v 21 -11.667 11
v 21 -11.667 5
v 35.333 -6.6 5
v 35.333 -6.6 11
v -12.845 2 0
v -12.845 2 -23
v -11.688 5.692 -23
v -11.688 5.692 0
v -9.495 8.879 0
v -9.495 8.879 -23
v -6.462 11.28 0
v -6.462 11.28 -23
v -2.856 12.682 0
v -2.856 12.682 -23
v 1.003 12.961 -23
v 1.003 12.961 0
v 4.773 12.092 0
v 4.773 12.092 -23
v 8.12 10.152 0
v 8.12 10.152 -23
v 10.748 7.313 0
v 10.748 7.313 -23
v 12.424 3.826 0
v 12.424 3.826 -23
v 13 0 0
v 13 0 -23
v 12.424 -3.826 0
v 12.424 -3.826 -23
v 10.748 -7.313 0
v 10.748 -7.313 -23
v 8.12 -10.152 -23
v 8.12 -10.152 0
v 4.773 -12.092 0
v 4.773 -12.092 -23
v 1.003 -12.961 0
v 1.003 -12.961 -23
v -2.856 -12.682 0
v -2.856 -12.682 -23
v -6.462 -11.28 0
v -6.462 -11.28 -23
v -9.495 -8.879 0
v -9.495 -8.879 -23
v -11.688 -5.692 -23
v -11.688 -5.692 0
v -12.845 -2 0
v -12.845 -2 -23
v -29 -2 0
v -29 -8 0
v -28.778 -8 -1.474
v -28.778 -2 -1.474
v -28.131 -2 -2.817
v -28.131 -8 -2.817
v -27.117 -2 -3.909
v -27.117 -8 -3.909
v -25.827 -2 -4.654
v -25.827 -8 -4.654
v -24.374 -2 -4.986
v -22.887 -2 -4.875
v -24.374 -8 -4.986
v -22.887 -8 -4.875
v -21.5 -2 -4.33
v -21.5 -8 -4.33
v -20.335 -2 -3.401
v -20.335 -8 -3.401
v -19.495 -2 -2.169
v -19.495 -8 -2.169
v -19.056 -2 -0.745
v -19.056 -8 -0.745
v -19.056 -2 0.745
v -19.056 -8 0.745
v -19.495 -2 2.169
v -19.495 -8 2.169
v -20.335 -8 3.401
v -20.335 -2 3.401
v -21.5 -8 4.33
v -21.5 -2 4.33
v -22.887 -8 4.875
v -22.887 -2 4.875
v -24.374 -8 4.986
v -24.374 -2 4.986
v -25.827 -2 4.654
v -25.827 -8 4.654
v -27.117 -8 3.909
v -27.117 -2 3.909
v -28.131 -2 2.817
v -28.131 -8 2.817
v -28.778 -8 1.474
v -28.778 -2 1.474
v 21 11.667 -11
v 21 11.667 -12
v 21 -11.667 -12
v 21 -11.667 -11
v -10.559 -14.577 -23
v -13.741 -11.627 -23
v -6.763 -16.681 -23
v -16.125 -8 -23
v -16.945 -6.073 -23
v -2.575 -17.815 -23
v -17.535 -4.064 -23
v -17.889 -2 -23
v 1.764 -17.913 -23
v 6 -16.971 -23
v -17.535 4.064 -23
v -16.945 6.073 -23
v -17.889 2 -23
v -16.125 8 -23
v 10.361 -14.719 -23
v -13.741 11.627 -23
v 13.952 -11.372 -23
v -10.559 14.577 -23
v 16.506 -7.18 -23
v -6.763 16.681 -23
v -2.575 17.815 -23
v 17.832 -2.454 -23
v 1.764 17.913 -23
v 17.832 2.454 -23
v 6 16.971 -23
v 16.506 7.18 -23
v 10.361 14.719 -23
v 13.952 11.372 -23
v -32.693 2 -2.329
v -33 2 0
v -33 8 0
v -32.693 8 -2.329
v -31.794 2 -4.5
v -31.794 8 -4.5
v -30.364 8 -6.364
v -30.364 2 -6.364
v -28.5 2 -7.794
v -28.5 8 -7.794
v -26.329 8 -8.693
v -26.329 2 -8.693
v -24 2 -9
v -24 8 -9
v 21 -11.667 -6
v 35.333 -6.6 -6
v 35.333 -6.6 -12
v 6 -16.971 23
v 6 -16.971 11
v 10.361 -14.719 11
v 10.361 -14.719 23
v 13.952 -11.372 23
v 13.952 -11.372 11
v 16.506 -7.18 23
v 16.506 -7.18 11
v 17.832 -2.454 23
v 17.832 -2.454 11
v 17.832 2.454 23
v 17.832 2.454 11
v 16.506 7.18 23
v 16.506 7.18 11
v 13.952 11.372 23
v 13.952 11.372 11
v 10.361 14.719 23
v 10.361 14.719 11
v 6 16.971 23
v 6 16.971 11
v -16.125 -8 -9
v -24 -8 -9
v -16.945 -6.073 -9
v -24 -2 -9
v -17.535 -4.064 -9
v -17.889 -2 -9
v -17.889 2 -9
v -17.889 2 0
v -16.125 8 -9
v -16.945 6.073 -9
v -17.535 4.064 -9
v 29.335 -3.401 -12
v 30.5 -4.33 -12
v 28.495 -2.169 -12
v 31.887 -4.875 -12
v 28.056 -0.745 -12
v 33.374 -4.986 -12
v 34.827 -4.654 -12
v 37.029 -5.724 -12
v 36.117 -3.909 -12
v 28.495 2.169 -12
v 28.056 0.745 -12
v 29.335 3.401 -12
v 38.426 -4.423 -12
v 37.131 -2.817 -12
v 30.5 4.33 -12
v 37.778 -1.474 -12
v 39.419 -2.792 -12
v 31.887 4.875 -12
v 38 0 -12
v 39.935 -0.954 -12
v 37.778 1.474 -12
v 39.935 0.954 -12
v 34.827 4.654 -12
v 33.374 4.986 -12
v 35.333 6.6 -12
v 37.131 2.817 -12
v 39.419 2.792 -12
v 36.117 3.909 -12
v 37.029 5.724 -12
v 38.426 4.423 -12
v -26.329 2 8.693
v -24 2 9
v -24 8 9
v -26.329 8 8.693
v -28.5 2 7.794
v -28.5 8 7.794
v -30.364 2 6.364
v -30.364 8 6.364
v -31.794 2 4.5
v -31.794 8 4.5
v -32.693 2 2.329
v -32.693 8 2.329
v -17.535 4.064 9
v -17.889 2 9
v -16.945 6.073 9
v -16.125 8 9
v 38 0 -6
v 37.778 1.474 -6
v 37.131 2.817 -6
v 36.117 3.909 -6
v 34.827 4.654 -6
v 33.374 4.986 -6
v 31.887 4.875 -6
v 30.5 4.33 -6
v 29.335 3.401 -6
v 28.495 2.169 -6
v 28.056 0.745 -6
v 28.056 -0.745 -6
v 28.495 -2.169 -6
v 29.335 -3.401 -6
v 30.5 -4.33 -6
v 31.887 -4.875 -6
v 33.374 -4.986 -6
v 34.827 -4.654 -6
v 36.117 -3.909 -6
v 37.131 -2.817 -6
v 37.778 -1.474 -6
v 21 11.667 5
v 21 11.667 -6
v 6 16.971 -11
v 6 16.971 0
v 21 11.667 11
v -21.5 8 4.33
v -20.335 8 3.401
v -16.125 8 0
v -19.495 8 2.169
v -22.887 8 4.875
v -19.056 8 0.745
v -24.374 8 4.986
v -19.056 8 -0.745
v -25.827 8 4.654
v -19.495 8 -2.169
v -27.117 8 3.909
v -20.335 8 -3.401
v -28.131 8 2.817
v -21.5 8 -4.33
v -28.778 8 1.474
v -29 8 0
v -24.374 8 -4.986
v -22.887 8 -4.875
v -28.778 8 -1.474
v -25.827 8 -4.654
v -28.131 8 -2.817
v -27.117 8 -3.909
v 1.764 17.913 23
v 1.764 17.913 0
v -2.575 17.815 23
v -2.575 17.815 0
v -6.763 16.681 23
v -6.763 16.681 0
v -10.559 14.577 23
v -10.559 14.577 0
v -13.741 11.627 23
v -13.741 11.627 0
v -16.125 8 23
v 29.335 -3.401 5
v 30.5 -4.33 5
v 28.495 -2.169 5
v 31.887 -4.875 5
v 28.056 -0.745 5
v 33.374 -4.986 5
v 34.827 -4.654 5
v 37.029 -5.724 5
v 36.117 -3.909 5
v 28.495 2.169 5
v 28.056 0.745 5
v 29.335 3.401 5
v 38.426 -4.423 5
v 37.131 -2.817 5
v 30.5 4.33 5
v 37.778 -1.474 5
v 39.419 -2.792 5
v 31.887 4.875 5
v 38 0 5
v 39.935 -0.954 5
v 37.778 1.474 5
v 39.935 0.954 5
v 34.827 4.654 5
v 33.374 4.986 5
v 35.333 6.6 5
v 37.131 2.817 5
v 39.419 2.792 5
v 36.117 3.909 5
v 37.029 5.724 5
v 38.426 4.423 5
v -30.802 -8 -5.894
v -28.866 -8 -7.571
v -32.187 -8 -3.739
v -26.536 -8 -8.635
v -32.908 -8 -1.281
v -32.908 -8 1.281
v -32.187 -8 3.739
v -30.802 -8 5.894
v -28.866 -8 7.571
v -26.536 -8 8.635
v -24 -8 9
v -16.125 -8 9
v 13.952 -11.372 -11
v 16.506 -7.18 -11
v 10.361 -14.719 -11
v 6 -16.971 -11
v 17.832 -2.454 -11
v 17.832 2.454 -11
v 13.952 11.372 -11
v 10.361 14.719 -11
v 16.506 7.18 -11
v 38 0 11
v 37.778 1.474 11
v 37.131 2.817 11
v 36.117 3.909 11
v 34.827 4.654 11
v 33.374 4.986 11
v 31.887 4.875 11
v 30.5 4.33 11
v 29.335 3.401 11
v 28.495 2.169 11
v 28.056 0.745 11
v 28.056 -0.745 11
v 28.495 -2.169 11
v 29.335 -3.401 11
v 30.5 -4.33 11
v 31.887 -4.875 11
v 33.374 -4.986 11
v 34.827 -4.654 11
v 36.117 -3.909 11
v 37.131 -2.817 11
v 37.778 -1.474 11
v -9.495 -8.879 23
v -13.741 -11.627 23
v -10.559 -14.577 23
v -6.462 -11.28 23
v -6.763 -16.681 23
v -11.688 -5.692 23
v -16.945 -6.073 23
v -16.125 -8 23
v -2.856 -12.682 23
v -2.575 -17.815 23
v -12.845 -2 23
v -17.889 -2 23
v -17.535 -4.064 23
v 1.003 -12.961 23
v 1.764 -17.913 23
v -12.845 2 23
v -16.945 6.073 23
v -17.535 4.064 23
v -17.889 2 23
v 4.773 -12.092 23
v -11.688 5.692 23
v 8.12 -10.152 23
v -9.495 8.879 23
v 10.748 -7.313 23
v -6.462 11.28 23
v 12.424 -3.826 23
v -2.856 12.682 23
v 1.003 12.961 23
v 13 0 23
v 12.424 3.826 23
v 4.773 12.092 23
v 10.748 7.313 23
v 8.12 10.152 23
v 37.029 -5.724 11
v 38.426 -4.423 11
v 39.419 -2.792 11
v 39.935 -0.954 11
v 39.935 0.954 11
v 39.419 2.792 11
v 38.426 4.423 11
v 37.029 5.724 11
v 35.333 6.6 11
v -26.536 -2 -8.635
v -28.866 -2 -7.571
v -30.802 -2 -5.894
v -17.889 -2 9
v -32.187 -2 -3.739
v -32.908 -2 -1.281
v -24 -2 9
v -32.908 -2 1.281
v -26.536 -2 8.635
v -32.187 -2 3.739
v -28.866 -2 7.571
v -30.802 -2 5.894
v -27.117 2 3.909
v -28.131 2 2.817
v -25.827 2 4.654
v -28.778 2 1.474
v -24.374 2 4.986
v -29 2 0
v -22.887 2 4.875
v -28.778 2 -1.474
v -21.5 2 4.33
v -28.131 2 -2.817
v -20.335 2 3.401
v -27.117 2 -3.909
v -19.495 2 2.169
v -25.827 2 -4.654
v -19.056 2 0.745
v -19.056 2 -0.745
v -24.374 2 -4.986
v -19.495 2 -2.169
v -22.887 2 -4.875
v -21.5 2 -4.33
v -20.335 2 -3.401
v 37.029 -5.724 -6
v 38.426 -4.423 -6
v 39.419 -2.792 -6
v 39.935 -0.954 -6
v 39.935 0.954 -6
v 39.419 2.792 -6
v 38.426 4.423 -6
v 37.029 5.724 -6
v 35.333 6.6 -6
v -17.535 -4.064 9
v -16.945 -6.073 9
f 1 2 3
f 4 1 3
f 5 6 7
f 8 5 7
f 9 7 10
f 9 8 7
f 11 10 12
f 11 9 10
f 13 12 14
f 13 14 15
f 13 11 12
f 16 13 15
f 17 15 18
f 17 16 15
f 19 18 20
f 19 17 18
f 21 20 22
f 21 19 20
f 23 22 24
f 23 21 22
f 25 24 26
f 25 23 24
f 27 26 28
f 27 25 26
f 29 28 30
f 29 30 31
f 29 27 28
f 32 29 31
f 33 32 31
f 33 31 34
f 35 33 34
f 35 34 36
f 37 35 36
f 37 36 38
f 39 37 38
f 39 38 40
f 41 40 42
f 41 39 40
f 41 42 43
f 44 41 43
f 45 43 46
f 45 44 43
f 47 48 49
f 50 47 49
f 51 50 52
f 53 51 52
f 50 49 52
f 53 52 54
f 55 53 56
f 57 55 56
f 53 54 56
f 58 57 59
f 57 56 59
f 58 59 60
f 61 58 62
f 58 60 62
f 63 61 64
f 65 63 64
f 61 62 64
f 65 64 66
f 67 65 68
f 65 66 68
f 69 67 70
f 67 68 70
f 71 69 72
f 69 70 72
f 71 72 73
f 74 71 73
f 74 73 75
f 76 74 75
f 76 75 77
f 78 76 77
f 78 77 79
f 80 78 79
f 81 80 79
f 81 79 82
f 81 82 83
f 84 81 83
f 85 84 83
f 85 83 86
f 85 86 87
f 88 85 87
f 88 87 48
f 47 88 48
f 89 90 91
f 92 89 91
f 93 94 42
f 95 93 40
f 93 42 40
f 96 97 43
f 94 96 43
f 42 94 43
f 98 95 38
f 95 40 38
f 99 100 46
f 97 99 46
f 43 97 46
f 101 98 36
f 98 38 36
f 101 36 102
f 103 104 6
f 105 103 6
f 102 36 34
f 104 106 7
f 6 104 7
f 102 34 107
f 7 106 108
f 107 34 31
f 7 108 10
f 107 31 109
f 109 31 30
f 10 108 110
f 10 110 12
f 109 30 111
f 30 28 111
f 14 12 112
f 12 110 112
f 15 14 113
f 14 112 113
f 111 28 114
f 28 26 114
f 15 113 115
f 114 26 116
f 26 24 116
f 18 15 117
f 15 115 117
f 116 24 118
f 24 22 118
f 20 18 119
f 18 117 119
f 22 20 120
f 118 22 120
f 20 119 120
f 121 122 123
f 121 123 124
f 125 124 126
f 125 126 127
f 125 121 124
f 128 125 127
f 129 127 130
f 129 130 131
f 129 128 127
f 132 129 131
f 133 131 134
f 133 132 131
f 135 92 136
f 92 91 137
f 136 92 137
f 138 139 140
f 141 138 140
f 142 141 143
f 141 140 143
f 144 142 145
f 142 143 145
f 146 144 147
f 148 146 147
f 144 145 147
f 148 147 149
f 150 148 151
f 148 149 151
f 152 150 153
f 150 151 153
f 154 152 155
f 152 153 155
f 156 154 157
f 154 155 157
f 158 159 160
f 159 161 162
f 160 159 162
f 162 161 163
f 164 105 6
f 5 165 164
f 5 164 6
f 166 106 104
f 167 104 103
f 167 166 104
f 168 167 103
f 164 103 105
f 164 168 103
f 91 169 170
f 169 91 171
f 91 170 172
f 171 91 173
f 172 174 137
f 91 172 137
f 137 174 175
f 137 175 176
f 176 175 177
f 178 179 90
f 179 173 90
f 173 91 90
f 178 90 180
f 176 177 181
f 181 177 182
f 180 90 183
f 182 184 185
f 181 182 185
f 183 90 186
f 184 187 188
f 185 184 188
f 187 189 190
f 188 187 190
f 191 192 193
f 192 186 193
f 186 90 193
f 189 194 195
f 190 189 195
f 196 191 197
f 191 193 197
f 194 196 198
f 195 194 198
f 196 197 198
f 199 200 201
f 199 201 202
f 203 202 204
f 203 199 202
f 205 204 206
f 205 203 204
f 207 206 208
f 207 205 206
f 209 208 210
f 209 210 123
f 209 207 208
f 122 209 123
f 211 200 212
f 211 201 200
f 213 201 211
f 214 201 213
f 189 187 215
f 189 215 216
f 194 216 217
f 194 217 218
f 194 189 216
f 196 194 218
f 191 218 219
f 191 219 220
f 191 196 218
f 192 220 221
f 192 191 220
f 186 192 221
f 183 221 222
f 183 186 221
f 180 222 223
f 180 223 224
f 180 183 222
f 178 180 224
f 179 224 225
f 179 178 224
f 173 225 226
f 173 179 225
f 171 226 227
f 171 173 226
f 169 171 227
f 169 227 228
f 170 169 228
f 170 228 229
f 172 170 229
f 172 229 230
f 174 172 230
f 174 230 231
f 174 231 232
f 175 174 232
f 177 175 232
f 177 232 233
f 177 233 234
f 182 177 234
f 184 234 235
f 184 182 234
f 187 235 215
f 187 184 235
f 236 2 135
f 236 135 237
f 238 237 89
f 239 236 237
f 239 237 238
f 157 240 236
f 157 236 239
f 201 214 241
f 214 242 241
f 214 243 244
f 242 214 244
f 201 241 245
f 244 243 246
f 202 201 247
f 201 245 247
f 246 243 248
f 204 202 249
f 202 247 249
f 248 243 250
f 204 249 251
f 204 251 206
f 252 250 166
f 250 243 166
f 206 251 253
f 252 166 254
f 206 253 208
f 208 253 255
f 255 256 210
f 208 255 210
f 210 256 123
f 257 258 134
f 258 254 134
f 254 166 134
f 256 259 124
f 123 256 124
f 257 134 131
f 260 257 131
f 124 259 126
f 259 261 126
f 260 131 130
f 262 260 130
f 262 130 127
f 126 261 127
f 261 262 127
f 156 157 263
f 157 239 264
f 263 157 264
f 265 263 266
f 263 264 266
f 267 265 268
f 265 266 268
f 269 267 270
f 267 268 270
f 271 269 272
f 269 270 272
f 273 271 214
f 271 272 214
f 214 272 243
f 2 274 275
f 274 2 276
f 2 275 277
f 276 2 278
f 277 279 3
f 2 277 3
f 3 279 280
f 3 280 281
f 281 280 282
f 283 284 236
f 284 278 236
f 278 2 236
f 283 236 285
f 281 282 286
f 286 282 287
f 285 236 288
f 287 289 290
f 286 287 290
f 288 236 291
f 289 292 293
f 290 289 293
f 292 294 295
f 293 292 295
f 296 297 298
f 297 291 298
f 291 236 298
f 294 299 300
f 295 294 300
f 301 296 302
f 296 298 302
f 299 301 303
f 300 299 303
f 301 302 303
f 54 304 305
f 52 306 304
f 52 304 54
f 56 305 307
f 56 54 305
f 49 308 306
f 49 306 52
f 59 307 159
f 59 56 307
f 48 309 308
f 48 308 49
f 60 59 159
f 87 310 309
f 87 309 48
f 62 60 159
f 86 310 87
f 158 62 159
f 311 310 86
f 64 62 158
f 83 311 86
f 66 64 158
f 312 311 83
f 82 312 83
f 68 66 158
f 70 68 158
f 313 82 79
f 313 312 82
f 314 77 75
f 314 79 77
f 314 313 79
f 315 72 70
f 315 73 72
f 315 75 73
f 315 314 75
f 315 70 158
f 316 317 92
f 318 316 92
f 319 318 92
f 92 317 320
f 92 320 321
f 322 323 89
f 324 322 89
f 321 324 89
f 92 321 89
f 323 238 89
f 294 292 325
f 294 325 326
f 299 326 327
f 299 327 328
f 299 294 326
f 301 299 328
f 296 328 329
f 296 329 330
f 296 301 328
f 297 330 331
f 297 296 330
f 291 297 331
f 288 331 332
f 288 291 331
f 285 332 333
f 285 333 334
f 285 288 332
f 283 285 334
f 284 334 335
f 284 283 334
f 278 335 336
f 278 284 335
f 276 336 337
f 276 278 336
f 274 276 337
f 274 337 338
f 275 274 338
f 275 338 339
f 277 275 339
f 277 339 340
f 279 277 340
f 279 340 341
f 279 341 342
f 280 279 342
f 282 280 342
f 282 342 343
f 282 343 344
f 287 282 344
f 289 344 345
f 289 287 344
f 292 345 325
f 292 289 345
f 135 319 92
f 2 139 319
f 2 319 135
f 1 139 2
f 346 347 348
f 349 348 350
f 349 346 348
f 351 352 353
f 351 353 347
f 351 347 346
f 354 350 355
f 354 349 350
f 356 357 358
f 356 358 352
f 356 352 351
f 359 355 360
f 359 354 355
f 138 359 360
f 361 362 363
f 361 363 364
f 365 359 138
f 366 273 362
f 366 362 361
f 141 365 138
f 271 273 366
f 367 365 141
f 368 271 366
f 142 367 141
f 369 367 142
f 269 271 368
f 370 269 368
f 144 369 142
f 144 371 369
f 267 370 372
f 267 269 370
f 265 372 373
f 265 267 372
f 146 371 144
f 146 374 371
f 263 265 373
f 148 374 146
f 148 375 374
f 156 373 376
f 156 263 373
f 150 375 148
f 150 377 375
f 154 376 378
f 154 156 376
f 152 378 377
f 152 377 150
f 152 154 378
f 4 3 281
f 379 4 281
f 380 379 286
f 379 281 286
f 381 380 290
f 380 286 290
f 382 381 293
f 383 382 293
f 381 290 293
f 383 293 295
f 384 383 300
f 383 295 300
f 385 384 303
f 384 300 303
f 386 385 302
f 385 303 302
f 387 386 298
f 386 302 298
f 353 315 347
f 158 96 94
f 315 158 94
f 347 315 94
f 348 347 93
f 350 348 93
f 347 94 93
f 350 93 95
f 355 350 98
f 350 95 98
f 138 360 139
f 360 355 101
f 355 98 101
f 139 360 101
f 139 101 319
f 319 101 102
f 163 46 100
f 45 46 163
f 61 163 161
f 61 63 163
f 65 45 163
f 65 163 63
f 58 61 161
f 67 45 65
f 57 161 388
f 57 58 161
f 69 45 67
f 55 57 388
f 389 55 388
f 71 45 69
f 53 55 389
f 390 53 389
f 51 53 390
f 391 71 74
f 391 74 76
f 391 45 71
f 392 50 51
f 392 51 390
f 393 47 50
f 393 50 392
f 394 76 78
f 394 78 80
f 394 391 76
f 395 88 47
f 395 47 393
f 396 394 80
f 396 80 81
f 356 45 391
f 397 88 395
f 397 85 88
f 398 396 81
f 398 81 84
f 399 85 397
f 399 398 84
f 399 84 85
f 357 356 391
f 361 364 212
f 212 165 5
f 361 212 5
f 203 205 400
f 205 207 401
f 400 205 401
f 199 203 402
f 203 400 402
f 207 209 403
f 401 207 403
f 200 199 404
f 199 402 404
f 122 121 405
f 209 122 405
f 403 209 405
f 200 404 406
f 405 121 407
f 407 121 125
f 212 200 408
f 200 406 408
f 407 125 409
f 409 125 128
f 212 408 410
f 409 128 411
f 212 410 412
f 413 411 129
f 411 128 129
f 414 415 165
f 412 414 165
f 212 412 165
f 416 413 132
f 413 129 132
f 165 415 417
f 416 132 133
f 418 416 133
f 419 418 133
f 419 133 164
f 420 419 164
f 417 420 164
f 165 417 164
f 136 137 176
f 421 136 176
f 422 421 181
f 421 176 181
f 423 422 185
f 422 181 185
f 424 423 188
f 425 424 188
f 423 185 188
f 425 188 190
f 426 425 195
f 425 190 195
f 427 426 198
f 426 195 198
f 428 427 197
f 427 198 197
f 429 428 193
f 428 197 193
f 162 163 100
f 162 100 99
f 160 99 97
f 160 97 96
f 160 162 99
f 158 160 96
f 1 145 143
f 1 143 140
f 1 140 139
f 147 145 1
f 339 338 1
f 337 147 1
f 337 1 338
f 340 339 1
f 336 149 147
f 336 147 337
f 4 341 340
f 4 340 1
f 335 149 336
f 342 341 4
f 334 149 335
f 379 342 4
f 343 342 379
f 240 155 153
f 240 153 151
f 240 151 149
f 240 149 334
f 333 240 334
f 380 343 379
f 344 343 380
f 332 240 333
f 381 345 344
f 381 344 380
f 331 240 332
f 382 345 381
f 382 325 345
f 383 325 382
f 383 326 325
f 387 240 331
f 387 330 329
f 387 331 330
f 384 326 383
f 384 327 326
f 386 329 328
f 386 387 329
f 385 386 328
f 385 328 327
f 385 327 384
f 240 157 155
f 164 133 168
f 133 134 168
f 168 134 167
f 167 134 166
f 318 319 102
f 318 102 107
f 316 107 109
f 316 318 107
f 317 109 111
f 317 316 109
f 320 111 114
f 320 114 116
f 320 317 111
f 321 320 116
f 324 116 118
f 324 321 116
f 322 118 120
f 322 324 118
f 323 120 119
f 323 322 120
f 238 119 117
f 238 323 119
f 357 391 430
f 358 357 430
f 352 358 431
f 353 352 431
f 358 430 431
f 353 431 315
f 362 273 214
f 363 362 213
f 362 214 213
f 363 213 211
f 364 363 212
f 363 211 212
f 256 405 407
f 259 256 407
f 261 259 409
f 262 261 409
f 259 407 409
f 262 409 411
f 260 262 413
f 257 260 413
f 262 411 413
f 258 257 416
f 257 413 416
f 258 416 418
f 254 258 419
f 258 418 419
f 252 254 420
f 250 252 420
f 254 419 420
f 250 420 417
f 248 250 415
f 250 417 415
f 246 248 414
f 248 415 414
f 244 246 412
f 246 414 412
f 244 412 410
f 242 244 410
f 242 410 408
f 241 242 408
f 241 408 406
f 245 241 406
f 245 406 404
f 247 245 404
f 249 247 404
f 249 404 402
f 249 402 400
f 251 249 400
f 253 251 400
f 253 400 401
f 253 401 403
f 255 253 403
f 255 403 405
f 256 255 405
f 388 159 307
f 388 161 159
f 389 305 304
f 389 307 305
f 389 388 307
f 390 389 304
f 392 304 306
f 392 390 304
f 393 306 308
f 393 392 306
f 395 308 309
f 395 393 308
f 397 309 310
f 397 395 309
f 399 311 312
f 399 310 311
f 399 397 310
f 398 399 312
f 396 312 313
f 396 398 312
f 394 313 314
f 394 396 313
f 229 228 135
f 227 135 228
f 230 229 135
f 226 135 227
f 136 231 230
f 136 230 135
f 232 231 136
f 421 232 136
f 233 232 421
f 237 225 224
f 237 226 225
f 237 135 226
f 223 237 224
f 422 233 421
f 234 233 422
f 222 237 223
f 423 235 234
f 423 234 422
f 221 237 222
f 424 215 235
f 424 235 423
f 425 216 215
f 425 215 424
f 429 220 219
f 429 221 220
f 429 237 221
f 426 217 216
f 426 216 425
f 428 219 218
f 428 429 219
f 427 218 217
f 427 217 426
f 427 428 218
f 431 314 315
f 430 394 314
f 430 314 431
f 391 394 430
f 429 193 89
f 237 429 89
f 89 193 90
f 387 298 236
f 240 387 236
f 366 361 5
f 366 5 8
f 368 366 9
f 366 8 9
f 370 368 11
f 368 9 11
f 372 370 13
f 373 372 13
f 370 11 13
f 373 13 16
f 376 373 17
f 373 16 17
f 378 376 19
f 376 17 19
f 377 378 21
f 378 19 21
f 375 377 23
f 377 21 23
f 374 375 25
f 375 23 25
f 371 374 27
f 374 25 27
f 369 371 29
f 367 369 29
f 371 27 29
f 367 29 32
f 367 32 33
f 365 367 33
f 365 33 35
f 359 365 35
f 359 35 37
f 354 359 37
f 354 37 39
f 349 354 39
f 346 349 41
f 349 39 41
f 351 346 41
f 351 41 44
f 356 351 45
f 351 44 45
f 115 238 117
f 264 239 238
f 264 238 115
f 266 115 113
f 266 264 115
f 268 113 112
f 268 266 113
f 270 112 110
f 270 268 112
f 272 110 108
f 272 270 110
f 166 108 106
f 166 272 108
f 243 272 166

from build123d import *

# Parameters (mm, degrees)
BOSS_EXTRUDE1_DEPTH    = 23
BOSS_EXTRUDE2_DEPTH    = 11
BOSS_EXTRUDE3_START    = 5
SKETCH1_4_R            = 5
BOSS_EXTRUDE3_DEPTH    = 6
BOSS_EXTRUDE4_START    = -12
SKETCH1_5_R            = 5
BOSS_EXTRUDE4_DEPTH    = 6
BOSS_EXTRUDE5_DEPTH    = 9
FILLET1_RADIUS         = 9
FILLET1_LENGTH         = 6
FILLET2_RADIUS         = 9
FILLET2_LENGTH         = 6
F_10_0MM_DOWEL_HOLE1_D = 10


with BuildPart() as part:
    # Sketch1 → Boss-Extrude1 (new, symmetric)
    with BuildSketch(Plane.XY):
        with BuildLine():
            ThreePointArc((6, 16.970562748), (-6.763446053, 16.681001094), (-16.124515497, 8))
            ThreePointArc((-16.124515497, 8), (-17.269106839, 5.077198931), (-17.88854382, 2))
            Line((-17.88854382, 2), (-12.845232579, 2))
            ThreePointArc((-12.845232579, 2), (13, 0), (-12.845232579, -2))
            Line((-12.845232579, -2), (-17.88854382, -2))
            ThreePointArc((-17.88854382, -2), (-17.269106839, -5.077198931), (-16.124515497, -8))
            ThreePointArc((-16.124515497, -8), (-6.763446053, -16.681001094), (6, -16.970562748))
            ThreePointArc((6, -16.970562748), (18, 0), (6, 16.970562748))
        make_face()
    extrude(amount=BOSS_EXTRUDE1_DEPTH, both=True)

    # Sketch1<3> → Boss-Extrude2 (add, symmetric)
    with BuildSketch(Plane.XY):
        with BuildLine():
            Line((21, 11.66726189), (6, 16.970562748))
            ThreePointArc((6, 16.970562748), (18, 0), (6, -16.970562748))
            Line((6, -16.970562748), (21, -11.66726189))
            Line((21, -11.66726189), (21, 11.66726189))
        make_face()
    extrude(amount=BOSS_EXTRUDE2_DEPTH, both=True)

    # Sketch1<4> → Boss-Extrude3 (add)
    with BuildSketch(Plane.XY.offset(BOSS_EXTRUDE3_START)):
        with BuildLine():
            Line((35.333333333, 6.599663291), (21, 11.66726189))
            Line((21, 11.66726189), (21, -11.66726189))
            Line((21, -11.66726189), (35.333333333, -6.599663291))
            ThreePointArc((35.333333333, -6.599663291), (40, 0), (35.333333333, 6.599663291))
        make_face()
        with Locations((33, 0)):
            Circle(SKETCH1_4_R, mode=Mode.SUBTRACT)
    extrude(amount=BOSS_EXTRUDE3_DEPTH)

    # Sketch1<5> → Boss-Extrude4 (add)
    with BuildSketch(Plane.XY.offset(BOSS_EXTRUDE4_START)):
        with BuildLine():
            Line((35.333333333, 6.599663291), (21, 11.66726189))
            Line((21, 11.66726189), (21, -11.66726189))
            Line((21, -11.66726189), (35.333333333, -6.599663291))
            ThreePointArc((35.333333333, -6.599663291), (40, 0), (35.333333333, 6.599663291))
        make_face()
        with Locations((33, 0)):
            Circle(SKETCH1_5_R, mode=Mode.SUBTRACT)
    extrude(amount=BOSS_EXTRUDE4_DEPTH)

    # Sketch1<6> → Boss-Extrude5 (add, symmetric)
    with BuildSketch(Plane.XY):
        with BuildLine():
            ThreePointArc((-17.88854382, 2), (-17.269106839, 5.077198931), (-16.124515497, 8))
            Line((-16.124515497, 8), (-33, 8))
            Line((-33, 8), (-33, 2))
            Line((-33, 2), (-17.88854382, 2))
        make_face()
        with BuildLine():
            Line((-33, -8), (-16.124515497, -8))
            ThreePointArc((-16.124515497, -8), (-17.269106839, -5.077198931), (-17.88854382, -2))
            Line((-17.88854382, -2), (-33, -2))
            Line((-33, -2), (-33, -8))
        make_face()
    extrude(amount=BOSS_EXTRUDE5_DEPTH, both=True)

    # Fillet1: full round fillet: the end face becomes a half cylinder, R = half its width
    fillet1_face = Plane((-33, 5, 0), x_dir=(0, -1, 0), z_dir=(-1, 0, 0))  # on the end face: x along it, z out of the body
    fillet1_slab = fillet1_face.offset(-FILLET1_RADIUS / 2) * Box(FILLET1_LENGTH, 2 * FILLET1_RADIUS, FILLET1_RADIUS, mode=Mode.PRIVATE)  # the body's end, R deep
    fillet1_round = Plane((-24, 5, 0), x_dir=(-1, 0, 0), z_dir=(0, -1, 0)) * Cylinder(FILLET1_RADIUS, FILLET1_LENGTH, mode=Mode.PRIVATE)  # its axis R under the face
    add(fillet1_slab - fillet1_round, mode=Mode.SUBTRACT)

    # Fillet2: full round fillet: the end face becomes a half cylinder, R = half its width
    fillet2_face = Plane((-33, -5, 0), x_dir=(0, 1, 0), z_dir=(-1, 0, 0))  # on the end face: x along it, z out of the body
    fillet2_slab = fillet2_face.offset(-FILLET2_RADIUS / 2) * Box(FILLET2_LENGTH, 2 * FILLET2_RADIUS, FILLET2_RADIUS, mode=Mode.PRIVATE)  # the body's end, R deep
    fillet2_round = Plane((-24, -5, 0), x_dir=(-1, 0, 0), z_dir=(0, 1, 0)) * Cylinder(FILLET2_RADIUS, FILLET2_LENGTH, mode=Mode.PRIVATE)  # its axis R under the face
    add(fillet2_slab - fillet2_round, mode=Mode.SUBTRACT)

    # Ø10.0mm Dowel Hole1 (through all)
    with Locations(Plane(origin=(-24, 8, 0), x_dir=(1, 0, 0), z_dir=(0, 1, 0))):
        with Locations((0, 0)):
            Hole(F_10_0MM_DOWEL_HOLE1_D / 2)


solid = part.part
